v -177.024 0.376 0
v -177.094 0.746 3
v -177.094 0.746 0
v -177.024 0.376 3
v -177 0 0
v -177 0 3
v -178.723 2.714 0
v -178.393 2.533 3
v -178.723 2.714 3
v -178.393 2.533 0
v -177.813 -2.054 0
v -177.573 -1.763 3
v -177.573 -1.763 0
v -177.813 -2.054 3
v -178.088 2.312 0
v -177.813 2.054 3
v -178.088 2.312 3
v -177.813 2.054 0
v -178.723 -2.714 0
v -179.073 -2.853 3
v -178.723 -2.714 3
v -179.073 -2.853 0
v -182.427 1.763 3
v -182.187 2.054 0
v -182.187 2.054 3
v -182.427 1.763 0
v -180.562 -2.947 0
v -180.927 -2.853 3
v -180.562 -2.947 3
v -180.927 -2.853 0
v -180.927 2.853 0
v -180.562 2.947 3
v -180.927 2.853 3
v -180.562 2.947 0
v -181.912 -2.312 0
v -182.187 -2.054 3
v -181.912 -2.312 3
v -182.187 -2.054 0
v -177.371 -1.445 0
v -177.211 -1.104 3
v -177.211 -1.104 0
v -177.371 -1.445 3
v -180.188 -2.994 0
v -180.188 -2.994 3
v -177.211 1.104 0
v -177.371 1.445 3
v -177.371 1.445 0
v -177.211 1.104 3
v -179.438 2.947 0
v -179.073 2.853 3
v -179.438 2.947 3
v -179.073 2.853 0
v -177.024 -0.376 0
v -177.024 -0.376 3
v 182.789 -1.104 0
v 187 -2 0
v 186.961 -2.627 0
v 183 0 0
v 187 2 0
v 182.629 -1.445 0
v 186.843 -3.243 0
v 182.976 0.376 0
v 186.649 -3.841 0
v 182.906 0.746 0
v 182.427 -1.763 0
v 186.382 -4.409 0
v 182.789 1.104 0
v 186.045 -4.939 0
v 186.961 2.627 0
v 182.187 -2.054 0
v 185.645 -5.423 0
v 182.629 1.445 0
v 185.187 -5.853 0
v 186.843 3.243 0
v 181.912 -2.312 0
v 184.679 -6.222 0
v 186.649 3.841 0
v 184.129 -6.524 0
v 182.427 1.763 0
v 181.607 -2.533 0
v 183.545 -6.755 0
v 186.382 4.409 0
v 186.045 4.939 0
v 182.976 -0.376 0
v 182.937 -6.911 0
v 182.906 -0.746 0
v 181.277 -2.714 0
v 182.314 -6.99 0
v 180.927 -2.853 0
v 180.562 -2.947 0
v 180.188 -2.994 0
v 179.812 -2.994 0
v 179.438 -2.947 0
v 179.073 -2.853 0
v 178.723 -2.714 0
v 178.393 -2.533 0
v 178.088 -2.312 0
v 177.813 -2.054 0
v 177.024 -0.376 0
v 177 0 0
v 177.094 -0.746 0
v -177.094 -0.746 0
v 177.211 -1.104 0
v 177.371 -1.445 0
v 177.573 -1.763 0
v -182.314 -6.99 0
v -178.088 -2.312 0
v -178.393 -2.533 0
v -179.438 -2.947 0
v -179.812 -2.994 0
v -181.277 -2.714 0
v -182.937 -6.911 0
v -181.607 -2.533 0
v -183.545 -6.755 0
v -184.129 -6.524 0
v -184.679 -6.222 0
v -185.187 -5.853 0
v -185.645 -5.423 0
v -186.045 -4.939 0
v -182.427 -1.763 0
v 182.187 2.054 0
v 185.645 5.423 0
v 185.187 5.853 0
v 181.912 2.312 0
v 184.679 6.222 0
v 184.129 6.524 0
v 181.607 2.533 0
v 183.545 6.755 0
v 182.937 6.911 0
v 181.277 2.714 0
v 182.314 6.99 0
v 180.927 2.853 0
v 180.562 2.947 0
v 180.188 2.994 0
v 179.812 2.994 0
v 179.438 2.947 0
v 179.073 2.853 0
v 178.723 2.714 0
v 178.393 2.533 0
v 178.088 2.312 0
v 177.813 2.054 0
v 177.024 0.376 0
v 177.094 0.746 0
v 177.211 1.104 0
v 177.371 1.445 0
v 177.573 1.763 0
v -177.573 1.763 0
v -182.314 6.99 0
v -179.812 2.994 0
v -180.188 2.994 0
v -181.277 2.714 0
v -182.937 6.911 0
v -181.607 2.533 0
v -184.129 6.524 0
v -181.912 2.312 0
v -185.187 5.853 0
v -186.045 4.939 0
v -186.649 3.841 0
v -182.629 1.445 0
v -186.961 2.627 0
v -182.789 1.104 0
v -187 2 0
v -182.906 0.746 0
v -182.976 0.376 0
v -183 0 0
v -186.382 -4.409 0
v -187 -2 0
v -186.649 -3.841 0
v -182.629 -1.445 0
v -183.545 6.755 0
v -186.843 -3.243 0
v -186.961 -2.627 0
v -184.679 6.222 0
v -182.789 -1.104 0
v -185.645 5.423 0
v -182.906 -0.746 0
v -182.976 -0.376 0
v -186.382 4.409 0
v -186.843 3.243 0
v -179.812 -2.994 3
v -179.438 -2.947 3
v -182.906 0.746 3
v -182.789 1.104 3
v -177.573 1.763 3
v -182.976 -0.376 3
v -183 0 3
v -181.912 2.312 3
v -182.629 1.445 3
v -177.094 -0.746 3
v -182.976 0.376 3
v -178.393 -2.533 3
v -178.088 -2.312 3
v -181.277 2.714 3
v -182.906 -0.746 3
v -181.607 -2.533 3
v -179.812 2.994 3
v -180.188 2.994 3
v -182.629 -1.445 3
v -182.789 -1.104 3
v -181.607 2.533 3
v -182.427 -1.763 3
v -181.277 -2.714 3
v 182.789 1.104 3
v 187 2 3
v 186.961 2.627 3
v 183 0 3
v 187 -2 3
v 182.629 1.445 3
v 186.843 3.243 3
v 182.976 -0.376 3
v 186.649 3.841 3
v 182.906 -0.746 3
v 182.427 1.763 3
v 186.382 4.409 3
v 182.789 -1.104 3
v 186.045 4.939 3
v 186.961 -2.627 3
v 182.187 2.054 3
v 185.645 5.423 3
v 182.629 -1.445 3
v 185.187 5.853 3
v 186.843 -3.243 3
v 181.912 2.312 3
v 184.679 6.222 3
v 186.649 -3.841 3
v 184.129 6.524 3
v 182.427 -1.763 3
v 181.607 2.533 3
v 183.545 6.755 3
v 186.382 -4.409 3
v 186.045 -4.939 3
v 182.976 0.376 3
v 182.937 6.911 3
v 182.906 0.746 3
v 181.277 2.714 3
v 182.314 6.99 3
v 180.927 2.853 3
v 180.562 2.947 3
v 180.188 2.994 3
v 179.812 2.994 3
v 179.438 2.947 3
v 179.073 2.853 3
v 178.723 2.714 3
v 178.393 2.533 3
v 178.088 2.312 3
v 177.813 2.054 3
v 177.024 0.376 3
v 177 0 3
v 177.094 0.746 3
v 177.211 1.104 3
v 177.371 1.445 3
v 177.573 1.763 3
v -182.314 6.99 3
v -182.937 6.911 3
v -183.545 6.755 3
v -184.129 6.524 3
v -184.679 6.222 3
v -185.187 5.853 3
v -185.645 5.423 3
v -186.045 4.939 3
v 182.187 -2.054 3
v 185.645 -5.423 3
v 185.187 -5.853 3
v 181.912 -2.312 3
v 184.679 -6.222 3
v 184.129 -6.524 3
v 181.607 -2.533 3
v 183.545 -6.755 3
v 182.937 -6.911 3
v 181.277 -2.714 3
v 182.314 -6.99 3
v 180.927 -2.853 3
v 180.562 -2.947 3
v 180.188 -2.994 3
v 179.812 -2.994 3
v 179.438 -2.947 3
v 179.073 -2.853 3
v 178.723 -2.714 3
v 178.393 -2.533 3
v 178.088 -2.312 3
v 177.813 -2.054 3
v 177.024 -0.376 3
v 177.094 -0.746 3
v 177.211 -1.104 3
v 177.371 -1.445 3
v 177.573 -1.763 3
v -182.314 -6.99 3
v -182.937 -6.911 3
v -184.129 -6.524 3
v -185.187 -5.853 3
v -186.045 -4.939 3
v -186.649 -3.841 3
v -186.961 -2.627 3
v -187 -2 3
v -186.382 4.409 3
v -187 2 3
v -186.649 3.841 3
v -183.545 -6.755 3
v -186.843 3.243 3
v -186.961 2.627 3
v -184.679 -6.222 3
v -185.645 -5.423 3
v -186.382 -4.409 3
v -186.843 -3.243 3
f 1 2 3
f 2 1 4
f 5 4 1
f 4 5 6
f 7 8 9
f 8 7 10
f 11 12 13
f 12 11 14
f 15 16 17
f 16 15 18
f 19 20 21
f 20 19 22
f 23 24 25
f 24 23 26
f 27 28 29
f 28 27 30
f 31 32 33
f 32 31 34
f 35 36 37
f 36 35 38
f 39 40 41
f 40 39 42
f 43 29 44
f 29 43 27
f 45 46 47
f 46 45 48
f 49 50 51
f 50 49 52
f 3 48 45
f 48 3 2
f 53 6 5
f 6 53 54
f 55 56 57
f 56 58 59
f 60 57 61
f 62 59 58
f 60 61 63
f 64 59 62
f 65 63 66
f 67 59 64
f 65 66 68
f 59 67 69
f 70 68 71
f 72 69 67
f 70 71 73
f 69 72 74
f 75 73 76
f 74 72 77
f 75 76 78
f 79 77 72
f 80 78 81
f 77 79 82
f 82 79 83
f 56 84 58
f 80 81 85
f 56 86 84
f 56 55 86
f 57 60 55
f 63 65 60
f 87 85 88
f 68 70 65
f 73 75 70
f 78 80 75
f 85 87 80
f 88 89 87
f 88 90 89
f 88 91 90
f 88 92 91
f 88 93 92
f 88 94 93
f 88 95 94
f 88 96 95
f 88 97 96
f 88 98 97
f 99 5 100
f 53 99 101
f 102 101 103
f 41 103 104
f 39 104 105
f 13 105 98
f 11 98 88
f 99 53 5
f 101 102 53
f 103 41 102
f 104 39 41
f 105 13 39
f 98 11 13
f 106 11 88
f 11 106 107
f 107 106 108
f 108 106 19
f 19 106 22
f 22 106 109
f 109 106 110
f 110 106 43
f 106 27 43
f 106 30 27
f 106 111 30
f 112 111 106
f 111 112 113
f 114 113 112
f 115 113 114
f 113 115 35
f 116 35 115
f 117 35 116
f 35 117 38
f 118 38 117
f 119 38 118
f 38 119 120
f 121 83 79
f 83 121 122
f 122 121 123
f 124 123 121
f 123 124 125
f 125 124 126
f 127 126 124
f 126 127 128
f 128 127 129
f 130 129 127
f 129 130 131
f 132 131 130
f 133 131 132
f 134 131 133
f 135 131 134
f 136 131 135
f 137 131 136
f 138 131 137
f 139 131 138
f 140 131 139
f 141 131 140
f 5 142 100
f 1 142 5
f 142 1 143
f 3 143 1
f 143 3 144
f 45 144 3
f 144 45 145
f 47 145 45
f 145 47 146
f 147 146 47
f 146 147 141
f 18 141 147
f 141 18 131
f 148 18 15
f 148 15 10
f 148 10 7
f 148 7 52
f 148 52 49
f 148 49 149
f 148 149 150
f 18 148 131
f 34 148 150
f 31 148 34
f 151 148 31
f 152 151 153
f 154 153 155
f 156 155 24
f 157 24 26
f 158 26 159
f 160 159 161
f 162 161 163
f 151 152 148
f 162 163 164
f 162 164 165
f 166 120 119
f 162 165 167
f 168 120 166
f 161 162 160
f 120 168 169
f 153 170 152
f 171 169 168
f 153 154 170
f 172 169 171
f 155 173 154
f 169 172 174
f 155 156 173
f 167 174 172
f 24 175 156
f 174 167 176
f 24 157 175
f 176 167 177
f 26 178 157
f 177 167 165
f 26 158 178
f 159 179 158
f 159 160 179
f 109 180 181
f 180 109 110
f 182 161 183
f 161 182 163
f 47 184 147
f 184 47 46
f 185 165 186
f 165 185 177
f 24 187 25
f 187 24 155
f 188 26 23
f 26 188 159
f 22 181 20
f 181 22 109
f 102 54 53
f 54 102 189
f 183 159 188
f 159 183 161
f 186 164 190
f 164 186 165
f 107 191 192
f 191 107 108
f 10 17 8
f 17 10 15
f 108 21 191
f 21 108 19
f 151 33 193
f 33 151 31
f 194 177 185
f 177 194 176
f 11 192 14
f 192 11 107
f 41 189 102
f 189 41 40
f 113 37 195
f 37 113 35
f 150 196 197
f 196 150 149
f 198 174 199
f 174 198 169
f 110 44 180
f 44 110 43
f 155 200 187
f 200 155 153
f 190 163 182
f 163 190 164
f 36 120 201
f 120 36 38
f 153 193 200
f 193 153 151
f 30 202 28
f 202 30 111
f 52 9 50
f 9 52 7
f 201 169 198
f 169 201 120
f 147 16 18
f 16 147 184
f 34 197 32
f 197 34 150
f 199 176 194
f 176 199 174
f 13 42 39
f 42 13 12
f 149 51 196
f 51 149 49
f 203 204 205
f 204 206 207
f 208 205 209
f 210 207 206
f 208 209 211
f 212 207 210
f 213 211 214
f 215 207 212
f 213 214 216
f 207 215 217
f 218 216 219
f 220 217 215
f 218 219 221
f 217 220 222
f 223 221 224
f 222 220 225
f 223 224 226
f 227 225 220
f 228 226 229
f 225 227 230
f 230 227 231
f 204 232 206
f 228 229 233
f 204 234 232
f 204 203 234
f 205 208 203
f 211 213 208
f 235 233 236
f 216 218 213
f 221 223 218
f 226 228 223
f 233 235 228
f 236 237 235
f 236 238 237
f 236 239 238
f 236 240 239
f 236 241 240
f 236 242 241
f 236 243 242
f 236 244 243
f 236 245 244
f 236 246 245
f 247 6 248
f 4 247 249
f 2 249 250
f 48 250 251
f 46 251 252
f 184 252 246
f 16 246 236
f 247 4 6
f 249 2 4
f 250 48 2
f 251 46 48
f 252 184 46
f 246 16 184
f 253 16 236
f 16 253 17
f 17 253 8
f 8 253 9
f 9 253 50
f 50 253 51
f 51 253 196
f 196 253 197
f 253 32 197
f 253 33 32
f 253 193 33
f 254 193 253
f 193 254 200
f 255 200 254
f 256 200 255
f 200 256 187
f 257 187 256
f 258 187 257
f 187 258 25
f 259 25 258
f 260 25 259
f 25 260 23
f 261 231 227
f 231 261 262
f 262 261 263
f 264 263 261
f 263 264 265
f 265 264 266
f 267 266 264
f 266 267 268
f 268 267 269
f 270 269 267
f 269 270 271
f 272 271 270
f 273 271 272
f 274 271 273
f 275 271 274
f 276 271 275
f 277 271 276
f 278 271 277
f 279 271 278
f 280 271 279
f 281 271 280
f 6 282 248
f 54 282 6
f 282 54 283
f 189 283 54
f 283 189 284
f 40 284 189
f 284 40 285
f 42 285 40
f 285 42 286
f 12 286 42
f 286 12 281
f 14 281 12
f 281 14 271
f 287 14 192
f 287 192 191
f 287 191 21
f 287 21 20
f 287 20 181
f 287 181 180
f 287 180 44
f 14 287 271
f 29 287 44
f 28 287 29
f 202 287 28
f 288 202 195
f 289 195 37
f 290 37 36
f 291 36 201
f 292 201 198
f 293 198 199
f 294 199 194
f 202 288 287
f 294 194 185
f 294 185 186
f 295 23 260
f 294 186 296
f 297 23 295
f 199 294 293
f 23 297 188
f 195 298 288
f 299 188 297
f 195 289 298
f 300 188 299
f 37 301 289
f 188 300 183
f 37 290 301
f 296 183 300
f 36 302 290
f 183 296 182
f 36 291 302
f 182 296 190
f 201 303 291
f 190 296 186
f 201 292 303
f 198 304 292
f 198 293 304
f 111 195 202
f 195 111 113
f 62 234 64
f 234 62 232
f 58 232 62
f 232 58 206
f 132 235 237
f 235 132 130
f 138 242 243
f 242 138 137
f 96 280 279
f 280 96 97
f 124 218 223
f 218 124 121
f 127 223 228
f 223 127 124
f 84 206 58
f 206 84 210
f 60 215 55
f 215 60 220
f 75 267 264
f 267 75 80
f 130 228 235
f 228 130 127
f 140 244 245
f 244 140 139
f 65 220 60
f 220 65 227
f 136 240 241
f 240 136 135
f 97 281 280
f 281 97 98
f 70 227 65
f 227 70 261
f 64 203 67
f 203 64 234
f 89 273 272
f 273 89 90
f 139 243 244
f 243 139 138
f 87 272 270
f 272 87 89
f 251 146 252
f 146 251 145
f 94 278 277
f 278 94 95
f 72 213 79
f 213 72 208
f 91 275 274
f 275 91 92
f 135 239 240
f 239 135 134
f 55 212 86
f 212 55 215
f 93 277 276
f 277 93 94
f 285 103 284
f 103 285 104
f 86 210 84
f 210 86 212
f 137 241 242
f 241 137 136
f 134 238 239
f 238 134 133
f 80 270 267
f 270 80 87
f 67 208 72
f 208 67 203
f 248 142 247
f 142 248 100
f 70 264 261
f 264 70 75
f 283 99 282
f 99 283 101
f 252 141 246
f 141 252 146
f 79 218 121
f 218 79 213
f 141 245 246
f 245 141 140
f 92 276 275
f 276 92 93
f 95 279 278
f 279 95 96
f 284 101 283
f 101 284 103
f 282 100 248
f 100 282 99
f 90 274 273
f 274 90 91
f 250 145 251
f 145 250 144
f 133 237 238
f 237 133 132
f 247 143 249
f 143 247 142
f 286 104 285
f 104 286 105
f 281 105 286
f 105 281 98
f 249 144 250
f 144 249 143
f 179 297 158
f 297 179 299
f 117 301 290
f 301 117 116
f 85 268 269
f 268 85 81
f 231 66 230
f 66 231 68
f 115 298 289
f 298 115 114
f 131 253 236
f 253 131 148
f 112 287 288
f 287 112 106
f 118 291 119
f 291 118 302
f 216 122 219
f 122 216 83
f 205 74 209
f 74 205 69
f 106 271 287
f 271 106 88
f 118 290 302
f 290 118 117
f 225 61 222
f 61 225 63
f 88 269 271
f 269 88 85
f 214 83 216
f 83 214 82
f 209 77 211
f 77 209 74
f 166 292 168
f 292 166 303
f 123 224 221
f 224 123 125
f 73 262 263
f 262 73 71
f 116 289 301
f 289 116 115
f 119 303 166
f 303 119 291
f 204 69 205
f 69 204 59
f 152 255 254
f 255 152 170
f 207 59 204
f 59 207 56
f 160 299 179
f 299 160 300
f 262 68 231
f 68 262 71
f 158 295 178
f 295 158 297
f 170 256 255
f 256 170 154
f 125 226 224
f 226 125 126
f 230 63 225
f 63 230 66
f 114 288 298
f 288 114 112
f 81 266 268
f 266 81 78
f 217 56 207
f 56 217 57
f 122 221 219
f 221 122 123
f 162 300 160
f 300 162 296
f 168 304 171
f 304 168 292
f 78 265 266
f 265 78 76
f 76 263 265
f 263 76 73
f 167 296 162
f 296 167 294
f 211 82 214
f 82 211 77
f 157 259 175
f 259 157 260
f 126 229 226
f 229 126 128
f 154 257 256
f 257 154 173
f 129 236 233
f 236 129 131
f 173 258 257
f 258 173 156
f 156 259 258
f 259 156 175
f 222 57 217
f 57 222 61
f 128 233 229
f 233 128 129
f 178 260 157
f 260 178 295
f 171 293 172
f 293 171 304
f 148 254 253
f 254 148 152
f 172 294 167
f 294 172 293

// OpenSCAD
$fn = 50;


difference() {
	union() {
		hull() {
			translate(v = [-182.0000000000, 2.0000000000, 0]) {
				cylinder(h = 3, r = 5);
			}
			translate(v = [182.0000000000, 2.0000000000, 0]) {
				cylinder(h = 3, r = 5);
			}
			translate(v = [-182.0000000000, -2.0000000000, 0]) {
				cylinder(h = 3, r = 5);
			}
			translate(v = [182.0000000000, -2.0000000000, 0]) {
				cylinder(h = 3, r = 5);
			}
		}
	}
	union() {
		translate(v = [-180.0000000000, 0.0000000000, 0]) {
			cylinder(h = 3, r = 3.0000000000);
		}
		translate(v = [180.0000000000, 0.0000000000, 0]) {
			cylinder(h = 3, r = 3.0000000000);
		}
		translate(v = [-180.0000000000, 0.0000000000, 0]) {
			cylinder(h = 3, r = 1.5000000000);
		}
		translate(v = [180.0000000000, 0.0000000000, 0]) {
			cylinder(h = 3, r = 1.5000000000);
		}
		translate(v = [-180.0000000000, 0.0000000000, 0]) {
			cylinder(h = 3, r = 1.5000000000);
		}
		translate(v = [180.0000000000, 0.0000000000, 0]) {
			cylinder(h = 3, r = 1.5000000000);
		}
		translate(v = [-180.0000000000, 0.0000000000, 0]) {
			cylinder(h = 3, r = 1.5000000000);
		}
		translate(v = [180.0000000000, 0.0000000000, 0]) {
			cylinder(h = 3, r = 1.5000000000);
		}
	}
}
